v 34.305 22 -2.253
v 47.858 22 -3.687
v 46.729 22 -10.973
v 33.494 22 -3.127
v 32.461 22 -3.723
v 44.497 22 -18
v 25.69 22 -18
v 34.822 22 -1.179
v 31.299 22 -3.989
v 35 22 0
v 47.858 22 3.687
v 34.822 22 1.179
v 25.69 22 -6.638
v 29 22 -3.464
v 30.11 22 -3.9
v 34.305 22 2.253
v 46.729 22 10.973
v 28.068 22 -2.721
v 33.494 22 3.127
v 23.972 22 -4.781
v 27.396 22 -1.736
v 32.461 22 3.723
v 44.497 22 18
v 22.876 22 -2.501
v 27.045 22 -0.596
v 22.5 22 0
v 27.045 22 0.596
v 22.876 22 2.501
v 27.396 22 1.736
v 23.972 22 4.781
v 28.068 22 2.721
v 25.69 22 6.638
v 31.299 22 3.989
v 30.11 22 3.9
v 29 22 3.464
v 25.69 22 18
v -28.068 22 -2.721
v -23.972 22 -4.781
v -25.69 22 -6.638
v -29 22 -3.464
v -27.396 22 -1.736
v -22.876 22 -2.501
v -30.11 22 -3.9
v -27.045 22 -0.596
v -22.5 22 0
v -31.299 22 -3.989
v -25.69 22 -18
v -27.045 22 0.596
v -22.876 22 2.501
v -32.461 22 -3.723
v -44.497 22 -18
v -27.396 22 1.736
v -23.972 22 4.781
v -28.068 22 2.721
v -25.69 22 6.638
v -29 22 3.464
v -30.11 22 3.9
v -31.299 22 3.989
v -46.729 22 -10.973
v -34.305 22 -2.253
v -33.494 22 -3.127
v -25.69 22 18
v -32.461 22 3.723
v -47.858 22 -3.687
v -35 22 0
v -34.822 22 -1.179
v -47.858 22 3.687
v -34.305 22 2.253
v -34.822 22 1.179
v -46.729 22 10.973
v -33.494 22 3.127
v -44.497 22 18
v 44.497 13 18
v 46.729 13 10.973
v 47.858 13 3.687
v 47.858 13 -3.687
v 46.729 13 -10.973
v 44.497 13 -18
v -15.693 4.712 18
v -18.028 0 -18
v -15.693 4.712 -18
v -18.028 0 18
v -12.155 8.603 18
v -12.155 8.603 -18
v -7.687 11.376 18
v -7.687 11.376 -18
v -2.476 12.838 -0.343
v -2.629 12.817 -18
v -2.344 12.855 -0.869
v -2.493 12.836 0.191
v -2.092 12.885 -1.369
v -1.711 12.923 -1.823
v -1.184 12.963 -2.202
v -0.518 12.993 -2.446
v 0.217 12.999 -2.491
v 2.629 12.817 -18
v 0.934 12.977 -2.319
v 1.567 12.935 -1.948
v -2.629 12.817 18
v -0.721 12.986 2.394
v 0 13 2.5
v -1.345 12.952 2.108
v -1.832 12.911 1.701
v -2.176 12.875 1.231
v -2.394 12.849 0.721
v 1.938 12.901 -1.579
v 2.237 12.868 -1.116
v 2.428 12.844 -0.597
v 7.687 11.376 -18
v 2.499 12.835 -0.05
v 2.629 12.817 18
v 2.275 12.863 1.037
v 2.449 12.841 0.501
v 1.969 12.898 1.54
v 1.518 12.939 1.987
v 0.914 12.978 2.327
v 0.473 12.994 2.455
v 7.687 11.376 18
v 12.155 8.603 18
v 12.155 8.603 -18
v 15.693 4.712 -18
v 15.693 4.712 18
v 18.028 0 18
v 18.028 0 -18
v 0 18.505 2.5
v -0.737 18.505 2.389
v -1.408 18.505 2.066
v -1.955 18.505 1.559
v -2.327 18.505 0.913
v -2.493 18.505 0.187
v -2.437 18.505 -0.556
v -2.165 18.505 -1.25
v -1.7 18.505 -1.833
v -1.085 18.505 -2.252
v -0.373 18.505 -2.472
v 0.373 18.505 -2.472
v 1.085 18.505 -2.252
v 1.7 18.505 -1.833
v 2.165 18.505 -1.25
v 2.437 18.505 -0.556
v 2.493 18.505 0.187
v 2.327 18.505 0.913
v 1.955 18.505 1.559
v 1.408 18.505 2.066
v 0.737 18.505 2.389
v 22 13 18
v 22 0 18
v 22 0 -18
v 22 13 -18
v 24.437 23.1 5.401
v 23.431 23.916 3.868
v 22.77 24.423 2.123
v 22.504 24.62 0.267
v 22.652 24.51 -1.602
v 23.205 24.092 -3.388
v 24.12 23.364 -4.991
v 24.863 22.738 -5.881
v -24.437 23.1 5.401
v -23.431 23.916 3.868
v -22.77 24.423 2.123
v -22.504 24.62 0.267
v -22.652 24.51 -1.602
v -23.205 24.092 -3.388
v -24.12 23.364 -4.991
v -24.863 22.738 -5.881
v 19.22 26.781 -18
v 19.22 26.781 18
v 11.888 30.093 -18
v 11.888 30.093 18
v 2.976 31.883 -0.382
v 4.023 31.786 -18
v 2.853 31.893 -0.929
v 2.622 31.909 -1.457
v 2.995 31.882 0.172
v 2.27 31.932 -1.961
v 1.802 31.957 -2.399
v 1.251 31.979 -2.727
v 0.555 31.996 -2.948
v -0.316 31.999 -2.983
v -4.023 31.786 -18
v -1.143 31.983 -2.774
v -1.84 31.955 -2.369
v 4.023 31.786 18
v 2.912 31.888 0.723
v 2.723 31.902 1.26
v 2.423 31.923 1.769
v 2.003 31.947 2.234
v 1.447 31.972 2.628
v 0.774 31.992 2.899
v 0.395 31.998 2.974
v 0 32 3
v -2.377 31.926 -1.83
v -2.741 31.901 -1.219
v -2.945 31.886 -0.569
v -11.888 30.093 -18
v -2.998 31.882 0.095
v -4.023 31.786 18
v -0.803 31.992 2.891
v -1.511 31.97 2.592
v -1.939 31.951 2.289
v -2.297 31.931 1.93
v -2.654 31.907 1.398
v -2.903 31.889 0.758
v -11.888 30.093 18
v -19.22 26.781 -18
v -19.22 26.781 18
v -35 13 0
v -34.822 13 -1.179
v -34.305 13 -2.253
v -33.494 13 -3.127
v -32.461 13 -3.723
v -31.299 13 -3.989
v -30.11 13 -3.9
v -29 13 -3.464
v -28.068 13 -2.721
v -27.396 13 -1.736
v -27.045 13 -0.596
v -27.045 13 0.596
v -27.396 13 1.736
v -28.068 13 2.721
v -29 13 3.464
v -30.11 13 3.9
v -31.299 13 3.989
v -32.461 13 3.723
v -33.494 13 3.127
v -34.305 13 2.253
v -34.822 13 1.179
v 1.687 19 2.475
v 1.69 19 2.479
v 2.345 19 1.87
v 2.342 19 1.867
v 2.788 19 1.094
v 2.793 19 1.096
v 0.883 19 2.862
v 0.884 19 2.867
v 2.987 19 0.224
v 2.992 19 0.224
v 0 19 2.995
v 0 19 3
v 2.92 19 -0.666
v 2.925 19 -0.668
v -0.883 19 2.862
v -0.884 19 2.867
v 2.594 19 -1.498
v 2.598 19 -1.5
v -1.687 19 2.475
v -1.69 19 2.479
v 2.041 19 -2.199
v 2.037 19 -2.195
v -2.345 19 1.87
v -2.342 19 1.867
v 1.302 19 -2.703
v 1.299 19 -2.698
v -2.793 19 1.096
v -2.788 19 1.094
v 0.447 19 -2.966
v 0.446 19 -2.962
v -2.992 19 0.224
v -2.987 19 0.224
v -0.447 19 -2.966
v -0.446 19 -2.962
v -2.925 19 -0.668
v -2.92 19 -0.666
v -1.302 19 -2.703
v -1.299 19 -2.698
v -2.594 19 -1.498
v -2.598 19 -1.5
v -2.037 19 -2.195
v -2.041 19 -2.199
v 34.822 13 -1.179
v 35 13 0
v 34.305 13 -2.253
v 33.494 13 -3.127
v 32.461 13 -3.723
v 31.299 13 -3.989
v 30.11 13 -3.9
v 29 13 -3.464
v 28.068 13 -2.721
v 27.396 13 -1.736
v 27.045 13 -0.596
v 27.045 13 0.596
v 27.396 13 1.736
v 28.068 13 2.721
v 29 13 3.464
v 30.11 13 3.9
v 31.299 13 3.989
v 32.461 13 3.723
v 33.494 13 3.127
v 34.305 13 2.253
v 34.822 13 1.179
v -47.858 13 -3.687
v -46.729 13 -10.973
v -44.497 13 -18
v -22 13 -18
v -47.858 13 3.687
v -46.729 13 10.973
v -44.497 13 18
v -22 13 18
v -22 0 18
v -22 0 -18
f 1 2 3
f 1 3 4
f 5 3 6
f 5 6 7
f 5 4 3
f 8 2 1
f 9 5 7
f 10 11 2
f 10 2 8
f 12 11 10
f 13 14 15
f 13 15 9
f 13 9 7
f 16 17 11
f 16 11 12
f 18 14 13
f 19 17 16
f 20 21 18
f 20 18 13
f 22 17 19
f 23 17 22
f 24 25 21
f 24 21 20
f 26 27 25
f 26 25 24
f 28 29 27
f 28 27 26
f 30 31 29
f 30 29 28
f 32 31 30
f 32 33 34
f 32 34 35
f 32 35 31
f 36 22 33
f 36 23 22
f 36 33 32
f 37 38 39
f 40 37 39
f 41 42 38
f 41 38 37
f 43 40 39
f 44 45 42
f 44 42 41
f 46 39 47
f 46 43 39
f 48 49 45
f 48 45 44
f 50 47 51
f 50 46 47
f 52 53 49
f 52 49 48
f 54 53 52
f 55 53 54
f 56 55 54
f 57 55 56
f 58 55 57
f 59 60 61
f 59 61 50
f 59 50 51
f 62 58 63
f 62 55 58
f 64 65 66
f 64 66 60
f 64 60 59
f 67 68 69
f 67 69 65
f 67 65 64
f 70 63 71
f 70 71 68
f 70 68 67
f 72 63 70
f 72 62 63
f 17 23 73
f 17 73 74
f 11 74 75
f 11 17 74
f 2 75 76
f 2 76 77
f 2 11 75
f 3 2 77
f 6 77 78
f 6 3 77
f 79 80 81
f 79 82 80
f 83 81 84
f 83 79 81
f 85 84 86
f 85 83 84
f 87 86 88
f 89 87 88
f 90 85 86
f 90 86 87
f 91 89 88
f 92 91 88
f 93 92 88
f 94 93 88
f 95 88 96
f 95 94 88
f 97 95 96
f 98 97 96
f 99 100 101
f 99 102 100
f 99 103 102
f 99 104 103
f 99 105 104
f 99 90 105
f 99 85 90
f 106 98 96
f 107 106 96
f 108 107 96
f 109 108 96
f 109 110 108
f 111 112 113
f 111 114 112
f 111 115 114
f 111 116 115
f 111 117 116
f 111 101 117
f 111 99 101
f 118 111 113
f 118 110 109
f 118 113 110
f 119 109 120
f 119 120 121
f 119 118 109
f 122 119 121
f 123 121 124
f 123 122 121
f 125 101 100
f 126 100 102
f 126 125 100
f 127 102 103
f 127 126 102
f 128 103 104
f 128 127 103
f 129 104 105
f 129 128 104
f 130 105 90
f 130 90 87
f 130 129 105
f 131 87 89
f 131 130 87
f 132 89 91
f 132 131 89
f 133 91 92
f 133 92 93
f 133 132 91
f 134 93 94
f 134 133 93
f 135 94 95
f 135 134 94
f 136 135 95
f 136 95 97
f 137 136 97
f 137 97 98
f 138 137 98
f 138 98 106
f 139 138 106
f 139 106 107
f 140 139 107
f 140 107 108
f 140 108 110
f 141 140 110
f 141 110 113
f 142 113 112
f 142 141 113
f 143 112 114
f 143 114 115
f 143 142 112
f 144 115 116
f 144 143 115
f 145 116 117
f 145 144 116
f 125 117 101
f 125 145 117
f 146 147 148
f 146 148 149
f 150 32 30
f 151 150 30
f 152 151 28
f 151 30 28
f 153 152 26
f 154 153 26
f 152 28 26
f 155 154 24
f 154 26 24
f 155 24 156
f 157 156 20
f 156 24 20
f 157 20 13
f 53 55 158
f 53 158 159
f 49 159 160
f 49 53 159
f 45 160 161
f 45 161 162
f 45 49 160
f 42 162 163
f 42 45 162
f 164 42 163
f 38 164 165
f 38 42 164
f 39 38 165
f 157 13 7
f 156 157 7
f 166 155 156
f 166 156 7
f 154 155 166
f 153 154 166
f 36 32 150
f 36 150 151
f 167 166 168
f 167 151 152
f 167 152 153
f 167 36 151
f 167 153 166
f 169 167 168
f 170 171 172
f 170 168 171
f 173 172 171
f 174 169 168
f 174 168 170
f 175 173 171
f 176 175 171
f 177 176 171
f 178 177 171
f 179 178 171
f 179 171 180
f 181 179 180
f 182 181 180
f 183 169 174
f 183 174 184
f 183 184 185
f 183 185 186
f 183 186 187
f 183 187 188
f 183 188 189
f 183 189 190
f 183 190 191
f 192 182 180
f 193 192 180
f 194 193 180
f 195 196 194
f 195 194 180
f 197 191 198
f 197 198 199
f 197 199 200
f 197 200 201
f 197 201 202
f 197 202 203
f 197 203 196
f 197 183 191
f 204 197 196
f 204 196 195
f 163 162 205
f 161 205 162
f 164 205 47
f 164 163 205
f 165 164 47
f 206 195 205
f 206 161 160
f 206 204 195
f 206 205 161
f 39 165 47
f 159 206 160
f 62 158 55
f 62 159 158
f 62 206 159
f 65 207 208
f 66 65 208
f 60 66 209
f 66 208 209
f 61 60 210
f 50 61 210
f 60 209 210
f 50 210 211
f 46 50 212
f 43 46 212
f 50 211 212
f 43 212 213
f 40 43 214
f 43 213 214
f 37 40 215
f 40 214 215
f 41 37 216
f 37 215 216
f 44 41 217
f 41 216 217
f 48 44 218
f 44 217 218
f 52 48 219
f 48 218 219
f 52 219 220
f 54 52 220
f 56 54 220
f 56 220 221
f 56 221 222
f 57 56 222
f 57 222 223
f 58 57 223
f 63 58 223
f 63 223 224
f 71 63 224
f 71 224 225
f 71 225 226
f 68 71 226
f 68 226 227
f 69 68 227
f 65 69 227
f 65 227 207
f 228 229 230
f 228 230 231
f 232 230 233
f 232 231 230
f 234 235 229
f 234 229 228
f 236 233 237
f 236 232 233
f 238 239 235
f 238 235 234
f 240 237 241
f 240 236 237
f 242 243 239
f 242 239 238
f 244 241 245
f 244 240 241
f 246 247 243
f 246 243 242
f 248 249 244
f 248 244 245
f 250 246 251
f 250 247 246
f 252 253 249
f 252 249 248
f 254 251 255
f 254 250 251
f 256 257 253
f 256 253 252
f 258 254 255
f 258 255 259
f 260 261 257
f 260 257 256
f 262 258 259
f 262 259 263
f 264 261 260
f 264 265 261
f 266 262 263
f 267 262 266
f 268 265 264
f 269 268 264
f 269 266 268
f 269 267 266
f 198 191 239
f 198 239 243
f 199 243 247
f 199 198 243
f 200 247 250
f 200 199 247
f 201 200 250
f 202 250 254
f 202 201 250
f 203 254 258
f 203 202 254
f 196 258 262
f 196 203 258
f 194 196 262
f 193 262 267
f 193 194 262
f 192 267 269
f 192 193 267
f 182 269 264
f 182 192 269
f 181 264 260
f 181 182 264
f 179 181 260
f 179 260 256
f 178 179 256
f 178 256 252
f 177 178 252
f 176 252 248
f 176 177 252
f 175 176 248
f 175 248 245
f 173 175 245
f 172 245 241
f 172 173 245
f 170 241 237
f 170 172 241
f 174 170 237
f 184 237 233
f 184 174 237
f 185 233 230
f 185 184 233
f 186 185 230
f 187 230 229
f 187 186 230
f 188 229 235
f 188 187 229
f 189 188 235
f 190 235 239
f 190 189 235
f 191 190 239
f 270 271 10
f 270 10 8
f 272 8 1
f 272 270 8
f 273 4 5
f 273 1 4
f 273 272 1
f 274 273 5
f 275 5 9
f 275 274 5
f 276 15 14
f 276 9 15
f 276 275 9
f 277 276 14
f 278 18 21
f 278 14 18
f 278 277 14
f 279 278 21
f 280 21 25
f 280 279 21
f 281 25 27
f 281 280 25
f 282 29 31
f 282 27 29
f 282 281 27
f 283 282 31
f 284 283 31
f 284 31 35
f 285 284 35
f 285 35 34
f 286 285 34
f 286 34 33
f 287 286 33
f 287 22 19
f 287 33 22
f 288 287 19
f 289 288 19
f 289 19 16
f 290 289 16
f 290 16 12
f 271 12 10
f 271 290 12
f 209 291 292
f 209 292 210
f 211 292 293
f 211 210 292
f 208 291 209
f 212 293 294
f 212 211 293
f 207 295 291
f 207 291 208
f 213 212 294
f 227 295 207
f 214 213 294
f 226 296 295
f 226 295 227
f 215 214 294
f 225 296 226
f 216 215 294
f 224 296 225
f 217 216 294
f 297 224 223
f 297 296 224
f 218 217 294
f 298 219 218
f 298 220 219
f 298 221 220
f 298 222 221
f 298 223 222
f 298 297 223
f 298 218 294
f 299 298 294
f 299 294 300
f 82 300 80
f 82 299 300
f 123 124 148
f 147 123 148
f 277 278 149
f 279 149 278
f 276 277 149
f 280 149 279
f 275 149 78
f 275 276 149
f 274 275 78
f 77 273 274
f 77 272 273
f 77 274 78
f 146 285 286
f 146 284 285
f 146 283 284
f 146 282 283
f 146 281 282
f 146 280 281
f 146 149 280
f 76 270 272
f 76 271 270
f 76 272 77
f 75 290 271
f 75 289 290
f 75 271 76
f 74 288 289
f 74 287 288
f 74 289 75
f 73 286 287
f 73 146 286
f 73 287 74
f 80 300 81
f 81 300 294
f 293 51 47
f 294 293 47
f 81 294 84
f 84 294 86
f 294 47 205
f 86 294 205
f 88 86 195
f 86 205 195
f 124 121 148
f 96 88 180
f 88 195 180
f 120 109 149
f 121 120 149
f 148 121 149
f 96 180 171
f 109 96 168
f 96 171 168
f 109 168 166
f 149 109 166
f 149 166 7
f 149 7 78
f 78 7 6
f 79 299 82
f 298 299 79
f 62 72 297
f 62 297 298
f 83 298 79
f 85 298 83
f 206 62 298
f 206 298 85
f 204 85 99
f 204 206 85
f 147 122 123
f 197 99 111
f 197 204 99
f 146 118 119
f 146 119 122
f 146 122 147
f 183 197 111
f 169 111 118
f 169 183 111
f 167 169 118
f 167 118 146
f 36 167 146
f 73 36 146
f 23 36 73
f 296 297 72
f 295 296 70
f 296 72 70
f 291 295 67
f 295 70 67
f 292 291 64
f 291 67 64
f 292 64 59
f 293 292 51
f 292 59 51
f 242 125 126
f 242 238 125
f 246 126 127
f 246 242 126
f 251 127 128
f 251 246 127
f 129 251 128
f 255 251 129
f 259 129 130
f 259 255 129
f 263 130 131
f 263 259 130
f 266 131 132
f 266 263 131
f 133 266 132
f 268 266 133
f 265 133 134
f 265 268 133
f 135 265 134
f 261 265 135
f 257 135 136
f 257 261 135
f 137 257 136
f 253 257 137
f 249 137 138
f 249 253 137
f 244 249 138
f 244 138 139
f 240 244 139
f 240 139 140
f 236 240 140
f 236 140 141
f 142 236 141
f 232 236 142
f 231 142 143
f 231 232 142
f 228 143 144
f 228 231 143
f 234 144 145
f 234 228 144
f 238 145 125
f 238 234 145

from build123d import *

# Parameters (mm, degrees)
BOSS_EXTRUDE1_DEPTH   = 18
F_8_0MM_DOWEL_HOLE1_D = 8
CUT_EXTRUDE1_DEPTH    = 36
CUT_EXTRUDE4_DEPTH    = 36


with BuildPart() as part:
    # Sketch2 → Boss-Extrude1 (new body, symmetric)
    with BuildSketch(Plane.XY):
        with BuildLine():
            Line((18.027756377, 0), (22, 0))
            Line((22, 0), (22, 13))
            Line((22, 13), (50, 13))
            Line((50, 13), (50, 22))
            Line((50, 22), (25.690465157, 22))
            ThreePointArc((25.690465157, 22), (0, 32), (-25.690465157, 22))
            Line((-25.690465157, 22), (-50, 22))
            Line((-50, 22), (-50, 13))
            Line((-50, 13), (-22, 13))
            Line((-22, 13), (-22, 0))
            Line((-22, 0), (-18.027756377, 0))
            ThreePointArc((-18.027756377, 0), (0, 13), (18.027756377, 0))
        make_face()
    extrude(amount=BOSS_EXTRUDE1_DEPTH, both=True)

    # Ø8.0mm Dowel Hole1 (through all)
    with Locations(Plane(origin=(0, 22, 0), x_dir=(1, 0, 0), z_dir=(0, 1, 0))):
        with Locations((-31, 0)):
            f_8_0mm_dowel_hole1 = Hole(F_8_0MM_DOWEL_HOLE1_D / 2)

    # Sketch9 → Cut-Extrude1 (cut)
    with BuildSketch(Plane(origin=(0, 22, 0), x_dir=(1, 0, 0), z_dir=(0, 1, 0))):
        with BuildLine():
            ThreePointArc((-44.497190923, -18), (-48, 0), (-44.497190923, 18))
            Line((-44.497190923, 18), (-50, 18))
            Line((-50, 18), (-50, -18))
            Line((-50, -18), (-44.497190923, -18))
        make_face()
    cut_extrude1 = extrude(amount=-CUT_EXTRUDE1_DEPTH, mode=Mode.SUBTRACT)

    # Mirror1: Ø8.0mm Dowel Hole1, Cut-Extrude1 across plane
    add(f_8_0mm_dowel_hole1.mirror(Plane(origin=(0, 0, 0), x_dir=(0, 0, 1), z_dir=(1, 0, 0))), mode=Mode.SUBTRACT)
    add(cut_extrude1.mirror(Plane(origin=(0, 0, 0), x_dir=(0, 0, 1), z_dir=(1, 0, 0))), mode=Mode.SUBTRACT)

    # Sketch10 → CBORE for M5 Hex Head Bolt1 (revolve, cut)
    with BuildSketch(Plane(origin=(0, 32, 0), x_dir=(0, 0, 1), z_dir=(1, 0, 0))):
        Polygon((0, 0), (0, 32), (2.5, 32), (2.5, 13.495), (2.995, 13), (3, 13), (3, 0), align=None)
    revolve(axis=Axis((0, 38.35, 0), (0, -1, 0)), mode=Mode.SUBTRACT)

    # Sketch12 → Cut-Extrude4 (cut)
    with BuildSketch(Plane(origin=(0, 22, 0), x_dir=(1, 0, 0), z_dir=(0, 1, 0))):
        with BuildLine():
            Line((-25.690465157, 6.637683312), (-25.690465157, -6.637683312))
            ThreePointArc((-25.690465157, -6.637683312), (-22.5, 0), (-25.690465157, 6.637683312))
        make_face()
    cut_extrude4 = extrude(amount=CUT_EXTRUDE4_DEPTH, mode=Mode.SUBTRACT)

    # Mirror2: Cut-Extrude4 across plane
    add(cut_extrude4.mirror(Plane(origin=(0, 0, 0), x_dir=(0, 0, 1), z_dir=(1, 0, 0))), mode=Mode.SUBTRACT)


solid = part.part
